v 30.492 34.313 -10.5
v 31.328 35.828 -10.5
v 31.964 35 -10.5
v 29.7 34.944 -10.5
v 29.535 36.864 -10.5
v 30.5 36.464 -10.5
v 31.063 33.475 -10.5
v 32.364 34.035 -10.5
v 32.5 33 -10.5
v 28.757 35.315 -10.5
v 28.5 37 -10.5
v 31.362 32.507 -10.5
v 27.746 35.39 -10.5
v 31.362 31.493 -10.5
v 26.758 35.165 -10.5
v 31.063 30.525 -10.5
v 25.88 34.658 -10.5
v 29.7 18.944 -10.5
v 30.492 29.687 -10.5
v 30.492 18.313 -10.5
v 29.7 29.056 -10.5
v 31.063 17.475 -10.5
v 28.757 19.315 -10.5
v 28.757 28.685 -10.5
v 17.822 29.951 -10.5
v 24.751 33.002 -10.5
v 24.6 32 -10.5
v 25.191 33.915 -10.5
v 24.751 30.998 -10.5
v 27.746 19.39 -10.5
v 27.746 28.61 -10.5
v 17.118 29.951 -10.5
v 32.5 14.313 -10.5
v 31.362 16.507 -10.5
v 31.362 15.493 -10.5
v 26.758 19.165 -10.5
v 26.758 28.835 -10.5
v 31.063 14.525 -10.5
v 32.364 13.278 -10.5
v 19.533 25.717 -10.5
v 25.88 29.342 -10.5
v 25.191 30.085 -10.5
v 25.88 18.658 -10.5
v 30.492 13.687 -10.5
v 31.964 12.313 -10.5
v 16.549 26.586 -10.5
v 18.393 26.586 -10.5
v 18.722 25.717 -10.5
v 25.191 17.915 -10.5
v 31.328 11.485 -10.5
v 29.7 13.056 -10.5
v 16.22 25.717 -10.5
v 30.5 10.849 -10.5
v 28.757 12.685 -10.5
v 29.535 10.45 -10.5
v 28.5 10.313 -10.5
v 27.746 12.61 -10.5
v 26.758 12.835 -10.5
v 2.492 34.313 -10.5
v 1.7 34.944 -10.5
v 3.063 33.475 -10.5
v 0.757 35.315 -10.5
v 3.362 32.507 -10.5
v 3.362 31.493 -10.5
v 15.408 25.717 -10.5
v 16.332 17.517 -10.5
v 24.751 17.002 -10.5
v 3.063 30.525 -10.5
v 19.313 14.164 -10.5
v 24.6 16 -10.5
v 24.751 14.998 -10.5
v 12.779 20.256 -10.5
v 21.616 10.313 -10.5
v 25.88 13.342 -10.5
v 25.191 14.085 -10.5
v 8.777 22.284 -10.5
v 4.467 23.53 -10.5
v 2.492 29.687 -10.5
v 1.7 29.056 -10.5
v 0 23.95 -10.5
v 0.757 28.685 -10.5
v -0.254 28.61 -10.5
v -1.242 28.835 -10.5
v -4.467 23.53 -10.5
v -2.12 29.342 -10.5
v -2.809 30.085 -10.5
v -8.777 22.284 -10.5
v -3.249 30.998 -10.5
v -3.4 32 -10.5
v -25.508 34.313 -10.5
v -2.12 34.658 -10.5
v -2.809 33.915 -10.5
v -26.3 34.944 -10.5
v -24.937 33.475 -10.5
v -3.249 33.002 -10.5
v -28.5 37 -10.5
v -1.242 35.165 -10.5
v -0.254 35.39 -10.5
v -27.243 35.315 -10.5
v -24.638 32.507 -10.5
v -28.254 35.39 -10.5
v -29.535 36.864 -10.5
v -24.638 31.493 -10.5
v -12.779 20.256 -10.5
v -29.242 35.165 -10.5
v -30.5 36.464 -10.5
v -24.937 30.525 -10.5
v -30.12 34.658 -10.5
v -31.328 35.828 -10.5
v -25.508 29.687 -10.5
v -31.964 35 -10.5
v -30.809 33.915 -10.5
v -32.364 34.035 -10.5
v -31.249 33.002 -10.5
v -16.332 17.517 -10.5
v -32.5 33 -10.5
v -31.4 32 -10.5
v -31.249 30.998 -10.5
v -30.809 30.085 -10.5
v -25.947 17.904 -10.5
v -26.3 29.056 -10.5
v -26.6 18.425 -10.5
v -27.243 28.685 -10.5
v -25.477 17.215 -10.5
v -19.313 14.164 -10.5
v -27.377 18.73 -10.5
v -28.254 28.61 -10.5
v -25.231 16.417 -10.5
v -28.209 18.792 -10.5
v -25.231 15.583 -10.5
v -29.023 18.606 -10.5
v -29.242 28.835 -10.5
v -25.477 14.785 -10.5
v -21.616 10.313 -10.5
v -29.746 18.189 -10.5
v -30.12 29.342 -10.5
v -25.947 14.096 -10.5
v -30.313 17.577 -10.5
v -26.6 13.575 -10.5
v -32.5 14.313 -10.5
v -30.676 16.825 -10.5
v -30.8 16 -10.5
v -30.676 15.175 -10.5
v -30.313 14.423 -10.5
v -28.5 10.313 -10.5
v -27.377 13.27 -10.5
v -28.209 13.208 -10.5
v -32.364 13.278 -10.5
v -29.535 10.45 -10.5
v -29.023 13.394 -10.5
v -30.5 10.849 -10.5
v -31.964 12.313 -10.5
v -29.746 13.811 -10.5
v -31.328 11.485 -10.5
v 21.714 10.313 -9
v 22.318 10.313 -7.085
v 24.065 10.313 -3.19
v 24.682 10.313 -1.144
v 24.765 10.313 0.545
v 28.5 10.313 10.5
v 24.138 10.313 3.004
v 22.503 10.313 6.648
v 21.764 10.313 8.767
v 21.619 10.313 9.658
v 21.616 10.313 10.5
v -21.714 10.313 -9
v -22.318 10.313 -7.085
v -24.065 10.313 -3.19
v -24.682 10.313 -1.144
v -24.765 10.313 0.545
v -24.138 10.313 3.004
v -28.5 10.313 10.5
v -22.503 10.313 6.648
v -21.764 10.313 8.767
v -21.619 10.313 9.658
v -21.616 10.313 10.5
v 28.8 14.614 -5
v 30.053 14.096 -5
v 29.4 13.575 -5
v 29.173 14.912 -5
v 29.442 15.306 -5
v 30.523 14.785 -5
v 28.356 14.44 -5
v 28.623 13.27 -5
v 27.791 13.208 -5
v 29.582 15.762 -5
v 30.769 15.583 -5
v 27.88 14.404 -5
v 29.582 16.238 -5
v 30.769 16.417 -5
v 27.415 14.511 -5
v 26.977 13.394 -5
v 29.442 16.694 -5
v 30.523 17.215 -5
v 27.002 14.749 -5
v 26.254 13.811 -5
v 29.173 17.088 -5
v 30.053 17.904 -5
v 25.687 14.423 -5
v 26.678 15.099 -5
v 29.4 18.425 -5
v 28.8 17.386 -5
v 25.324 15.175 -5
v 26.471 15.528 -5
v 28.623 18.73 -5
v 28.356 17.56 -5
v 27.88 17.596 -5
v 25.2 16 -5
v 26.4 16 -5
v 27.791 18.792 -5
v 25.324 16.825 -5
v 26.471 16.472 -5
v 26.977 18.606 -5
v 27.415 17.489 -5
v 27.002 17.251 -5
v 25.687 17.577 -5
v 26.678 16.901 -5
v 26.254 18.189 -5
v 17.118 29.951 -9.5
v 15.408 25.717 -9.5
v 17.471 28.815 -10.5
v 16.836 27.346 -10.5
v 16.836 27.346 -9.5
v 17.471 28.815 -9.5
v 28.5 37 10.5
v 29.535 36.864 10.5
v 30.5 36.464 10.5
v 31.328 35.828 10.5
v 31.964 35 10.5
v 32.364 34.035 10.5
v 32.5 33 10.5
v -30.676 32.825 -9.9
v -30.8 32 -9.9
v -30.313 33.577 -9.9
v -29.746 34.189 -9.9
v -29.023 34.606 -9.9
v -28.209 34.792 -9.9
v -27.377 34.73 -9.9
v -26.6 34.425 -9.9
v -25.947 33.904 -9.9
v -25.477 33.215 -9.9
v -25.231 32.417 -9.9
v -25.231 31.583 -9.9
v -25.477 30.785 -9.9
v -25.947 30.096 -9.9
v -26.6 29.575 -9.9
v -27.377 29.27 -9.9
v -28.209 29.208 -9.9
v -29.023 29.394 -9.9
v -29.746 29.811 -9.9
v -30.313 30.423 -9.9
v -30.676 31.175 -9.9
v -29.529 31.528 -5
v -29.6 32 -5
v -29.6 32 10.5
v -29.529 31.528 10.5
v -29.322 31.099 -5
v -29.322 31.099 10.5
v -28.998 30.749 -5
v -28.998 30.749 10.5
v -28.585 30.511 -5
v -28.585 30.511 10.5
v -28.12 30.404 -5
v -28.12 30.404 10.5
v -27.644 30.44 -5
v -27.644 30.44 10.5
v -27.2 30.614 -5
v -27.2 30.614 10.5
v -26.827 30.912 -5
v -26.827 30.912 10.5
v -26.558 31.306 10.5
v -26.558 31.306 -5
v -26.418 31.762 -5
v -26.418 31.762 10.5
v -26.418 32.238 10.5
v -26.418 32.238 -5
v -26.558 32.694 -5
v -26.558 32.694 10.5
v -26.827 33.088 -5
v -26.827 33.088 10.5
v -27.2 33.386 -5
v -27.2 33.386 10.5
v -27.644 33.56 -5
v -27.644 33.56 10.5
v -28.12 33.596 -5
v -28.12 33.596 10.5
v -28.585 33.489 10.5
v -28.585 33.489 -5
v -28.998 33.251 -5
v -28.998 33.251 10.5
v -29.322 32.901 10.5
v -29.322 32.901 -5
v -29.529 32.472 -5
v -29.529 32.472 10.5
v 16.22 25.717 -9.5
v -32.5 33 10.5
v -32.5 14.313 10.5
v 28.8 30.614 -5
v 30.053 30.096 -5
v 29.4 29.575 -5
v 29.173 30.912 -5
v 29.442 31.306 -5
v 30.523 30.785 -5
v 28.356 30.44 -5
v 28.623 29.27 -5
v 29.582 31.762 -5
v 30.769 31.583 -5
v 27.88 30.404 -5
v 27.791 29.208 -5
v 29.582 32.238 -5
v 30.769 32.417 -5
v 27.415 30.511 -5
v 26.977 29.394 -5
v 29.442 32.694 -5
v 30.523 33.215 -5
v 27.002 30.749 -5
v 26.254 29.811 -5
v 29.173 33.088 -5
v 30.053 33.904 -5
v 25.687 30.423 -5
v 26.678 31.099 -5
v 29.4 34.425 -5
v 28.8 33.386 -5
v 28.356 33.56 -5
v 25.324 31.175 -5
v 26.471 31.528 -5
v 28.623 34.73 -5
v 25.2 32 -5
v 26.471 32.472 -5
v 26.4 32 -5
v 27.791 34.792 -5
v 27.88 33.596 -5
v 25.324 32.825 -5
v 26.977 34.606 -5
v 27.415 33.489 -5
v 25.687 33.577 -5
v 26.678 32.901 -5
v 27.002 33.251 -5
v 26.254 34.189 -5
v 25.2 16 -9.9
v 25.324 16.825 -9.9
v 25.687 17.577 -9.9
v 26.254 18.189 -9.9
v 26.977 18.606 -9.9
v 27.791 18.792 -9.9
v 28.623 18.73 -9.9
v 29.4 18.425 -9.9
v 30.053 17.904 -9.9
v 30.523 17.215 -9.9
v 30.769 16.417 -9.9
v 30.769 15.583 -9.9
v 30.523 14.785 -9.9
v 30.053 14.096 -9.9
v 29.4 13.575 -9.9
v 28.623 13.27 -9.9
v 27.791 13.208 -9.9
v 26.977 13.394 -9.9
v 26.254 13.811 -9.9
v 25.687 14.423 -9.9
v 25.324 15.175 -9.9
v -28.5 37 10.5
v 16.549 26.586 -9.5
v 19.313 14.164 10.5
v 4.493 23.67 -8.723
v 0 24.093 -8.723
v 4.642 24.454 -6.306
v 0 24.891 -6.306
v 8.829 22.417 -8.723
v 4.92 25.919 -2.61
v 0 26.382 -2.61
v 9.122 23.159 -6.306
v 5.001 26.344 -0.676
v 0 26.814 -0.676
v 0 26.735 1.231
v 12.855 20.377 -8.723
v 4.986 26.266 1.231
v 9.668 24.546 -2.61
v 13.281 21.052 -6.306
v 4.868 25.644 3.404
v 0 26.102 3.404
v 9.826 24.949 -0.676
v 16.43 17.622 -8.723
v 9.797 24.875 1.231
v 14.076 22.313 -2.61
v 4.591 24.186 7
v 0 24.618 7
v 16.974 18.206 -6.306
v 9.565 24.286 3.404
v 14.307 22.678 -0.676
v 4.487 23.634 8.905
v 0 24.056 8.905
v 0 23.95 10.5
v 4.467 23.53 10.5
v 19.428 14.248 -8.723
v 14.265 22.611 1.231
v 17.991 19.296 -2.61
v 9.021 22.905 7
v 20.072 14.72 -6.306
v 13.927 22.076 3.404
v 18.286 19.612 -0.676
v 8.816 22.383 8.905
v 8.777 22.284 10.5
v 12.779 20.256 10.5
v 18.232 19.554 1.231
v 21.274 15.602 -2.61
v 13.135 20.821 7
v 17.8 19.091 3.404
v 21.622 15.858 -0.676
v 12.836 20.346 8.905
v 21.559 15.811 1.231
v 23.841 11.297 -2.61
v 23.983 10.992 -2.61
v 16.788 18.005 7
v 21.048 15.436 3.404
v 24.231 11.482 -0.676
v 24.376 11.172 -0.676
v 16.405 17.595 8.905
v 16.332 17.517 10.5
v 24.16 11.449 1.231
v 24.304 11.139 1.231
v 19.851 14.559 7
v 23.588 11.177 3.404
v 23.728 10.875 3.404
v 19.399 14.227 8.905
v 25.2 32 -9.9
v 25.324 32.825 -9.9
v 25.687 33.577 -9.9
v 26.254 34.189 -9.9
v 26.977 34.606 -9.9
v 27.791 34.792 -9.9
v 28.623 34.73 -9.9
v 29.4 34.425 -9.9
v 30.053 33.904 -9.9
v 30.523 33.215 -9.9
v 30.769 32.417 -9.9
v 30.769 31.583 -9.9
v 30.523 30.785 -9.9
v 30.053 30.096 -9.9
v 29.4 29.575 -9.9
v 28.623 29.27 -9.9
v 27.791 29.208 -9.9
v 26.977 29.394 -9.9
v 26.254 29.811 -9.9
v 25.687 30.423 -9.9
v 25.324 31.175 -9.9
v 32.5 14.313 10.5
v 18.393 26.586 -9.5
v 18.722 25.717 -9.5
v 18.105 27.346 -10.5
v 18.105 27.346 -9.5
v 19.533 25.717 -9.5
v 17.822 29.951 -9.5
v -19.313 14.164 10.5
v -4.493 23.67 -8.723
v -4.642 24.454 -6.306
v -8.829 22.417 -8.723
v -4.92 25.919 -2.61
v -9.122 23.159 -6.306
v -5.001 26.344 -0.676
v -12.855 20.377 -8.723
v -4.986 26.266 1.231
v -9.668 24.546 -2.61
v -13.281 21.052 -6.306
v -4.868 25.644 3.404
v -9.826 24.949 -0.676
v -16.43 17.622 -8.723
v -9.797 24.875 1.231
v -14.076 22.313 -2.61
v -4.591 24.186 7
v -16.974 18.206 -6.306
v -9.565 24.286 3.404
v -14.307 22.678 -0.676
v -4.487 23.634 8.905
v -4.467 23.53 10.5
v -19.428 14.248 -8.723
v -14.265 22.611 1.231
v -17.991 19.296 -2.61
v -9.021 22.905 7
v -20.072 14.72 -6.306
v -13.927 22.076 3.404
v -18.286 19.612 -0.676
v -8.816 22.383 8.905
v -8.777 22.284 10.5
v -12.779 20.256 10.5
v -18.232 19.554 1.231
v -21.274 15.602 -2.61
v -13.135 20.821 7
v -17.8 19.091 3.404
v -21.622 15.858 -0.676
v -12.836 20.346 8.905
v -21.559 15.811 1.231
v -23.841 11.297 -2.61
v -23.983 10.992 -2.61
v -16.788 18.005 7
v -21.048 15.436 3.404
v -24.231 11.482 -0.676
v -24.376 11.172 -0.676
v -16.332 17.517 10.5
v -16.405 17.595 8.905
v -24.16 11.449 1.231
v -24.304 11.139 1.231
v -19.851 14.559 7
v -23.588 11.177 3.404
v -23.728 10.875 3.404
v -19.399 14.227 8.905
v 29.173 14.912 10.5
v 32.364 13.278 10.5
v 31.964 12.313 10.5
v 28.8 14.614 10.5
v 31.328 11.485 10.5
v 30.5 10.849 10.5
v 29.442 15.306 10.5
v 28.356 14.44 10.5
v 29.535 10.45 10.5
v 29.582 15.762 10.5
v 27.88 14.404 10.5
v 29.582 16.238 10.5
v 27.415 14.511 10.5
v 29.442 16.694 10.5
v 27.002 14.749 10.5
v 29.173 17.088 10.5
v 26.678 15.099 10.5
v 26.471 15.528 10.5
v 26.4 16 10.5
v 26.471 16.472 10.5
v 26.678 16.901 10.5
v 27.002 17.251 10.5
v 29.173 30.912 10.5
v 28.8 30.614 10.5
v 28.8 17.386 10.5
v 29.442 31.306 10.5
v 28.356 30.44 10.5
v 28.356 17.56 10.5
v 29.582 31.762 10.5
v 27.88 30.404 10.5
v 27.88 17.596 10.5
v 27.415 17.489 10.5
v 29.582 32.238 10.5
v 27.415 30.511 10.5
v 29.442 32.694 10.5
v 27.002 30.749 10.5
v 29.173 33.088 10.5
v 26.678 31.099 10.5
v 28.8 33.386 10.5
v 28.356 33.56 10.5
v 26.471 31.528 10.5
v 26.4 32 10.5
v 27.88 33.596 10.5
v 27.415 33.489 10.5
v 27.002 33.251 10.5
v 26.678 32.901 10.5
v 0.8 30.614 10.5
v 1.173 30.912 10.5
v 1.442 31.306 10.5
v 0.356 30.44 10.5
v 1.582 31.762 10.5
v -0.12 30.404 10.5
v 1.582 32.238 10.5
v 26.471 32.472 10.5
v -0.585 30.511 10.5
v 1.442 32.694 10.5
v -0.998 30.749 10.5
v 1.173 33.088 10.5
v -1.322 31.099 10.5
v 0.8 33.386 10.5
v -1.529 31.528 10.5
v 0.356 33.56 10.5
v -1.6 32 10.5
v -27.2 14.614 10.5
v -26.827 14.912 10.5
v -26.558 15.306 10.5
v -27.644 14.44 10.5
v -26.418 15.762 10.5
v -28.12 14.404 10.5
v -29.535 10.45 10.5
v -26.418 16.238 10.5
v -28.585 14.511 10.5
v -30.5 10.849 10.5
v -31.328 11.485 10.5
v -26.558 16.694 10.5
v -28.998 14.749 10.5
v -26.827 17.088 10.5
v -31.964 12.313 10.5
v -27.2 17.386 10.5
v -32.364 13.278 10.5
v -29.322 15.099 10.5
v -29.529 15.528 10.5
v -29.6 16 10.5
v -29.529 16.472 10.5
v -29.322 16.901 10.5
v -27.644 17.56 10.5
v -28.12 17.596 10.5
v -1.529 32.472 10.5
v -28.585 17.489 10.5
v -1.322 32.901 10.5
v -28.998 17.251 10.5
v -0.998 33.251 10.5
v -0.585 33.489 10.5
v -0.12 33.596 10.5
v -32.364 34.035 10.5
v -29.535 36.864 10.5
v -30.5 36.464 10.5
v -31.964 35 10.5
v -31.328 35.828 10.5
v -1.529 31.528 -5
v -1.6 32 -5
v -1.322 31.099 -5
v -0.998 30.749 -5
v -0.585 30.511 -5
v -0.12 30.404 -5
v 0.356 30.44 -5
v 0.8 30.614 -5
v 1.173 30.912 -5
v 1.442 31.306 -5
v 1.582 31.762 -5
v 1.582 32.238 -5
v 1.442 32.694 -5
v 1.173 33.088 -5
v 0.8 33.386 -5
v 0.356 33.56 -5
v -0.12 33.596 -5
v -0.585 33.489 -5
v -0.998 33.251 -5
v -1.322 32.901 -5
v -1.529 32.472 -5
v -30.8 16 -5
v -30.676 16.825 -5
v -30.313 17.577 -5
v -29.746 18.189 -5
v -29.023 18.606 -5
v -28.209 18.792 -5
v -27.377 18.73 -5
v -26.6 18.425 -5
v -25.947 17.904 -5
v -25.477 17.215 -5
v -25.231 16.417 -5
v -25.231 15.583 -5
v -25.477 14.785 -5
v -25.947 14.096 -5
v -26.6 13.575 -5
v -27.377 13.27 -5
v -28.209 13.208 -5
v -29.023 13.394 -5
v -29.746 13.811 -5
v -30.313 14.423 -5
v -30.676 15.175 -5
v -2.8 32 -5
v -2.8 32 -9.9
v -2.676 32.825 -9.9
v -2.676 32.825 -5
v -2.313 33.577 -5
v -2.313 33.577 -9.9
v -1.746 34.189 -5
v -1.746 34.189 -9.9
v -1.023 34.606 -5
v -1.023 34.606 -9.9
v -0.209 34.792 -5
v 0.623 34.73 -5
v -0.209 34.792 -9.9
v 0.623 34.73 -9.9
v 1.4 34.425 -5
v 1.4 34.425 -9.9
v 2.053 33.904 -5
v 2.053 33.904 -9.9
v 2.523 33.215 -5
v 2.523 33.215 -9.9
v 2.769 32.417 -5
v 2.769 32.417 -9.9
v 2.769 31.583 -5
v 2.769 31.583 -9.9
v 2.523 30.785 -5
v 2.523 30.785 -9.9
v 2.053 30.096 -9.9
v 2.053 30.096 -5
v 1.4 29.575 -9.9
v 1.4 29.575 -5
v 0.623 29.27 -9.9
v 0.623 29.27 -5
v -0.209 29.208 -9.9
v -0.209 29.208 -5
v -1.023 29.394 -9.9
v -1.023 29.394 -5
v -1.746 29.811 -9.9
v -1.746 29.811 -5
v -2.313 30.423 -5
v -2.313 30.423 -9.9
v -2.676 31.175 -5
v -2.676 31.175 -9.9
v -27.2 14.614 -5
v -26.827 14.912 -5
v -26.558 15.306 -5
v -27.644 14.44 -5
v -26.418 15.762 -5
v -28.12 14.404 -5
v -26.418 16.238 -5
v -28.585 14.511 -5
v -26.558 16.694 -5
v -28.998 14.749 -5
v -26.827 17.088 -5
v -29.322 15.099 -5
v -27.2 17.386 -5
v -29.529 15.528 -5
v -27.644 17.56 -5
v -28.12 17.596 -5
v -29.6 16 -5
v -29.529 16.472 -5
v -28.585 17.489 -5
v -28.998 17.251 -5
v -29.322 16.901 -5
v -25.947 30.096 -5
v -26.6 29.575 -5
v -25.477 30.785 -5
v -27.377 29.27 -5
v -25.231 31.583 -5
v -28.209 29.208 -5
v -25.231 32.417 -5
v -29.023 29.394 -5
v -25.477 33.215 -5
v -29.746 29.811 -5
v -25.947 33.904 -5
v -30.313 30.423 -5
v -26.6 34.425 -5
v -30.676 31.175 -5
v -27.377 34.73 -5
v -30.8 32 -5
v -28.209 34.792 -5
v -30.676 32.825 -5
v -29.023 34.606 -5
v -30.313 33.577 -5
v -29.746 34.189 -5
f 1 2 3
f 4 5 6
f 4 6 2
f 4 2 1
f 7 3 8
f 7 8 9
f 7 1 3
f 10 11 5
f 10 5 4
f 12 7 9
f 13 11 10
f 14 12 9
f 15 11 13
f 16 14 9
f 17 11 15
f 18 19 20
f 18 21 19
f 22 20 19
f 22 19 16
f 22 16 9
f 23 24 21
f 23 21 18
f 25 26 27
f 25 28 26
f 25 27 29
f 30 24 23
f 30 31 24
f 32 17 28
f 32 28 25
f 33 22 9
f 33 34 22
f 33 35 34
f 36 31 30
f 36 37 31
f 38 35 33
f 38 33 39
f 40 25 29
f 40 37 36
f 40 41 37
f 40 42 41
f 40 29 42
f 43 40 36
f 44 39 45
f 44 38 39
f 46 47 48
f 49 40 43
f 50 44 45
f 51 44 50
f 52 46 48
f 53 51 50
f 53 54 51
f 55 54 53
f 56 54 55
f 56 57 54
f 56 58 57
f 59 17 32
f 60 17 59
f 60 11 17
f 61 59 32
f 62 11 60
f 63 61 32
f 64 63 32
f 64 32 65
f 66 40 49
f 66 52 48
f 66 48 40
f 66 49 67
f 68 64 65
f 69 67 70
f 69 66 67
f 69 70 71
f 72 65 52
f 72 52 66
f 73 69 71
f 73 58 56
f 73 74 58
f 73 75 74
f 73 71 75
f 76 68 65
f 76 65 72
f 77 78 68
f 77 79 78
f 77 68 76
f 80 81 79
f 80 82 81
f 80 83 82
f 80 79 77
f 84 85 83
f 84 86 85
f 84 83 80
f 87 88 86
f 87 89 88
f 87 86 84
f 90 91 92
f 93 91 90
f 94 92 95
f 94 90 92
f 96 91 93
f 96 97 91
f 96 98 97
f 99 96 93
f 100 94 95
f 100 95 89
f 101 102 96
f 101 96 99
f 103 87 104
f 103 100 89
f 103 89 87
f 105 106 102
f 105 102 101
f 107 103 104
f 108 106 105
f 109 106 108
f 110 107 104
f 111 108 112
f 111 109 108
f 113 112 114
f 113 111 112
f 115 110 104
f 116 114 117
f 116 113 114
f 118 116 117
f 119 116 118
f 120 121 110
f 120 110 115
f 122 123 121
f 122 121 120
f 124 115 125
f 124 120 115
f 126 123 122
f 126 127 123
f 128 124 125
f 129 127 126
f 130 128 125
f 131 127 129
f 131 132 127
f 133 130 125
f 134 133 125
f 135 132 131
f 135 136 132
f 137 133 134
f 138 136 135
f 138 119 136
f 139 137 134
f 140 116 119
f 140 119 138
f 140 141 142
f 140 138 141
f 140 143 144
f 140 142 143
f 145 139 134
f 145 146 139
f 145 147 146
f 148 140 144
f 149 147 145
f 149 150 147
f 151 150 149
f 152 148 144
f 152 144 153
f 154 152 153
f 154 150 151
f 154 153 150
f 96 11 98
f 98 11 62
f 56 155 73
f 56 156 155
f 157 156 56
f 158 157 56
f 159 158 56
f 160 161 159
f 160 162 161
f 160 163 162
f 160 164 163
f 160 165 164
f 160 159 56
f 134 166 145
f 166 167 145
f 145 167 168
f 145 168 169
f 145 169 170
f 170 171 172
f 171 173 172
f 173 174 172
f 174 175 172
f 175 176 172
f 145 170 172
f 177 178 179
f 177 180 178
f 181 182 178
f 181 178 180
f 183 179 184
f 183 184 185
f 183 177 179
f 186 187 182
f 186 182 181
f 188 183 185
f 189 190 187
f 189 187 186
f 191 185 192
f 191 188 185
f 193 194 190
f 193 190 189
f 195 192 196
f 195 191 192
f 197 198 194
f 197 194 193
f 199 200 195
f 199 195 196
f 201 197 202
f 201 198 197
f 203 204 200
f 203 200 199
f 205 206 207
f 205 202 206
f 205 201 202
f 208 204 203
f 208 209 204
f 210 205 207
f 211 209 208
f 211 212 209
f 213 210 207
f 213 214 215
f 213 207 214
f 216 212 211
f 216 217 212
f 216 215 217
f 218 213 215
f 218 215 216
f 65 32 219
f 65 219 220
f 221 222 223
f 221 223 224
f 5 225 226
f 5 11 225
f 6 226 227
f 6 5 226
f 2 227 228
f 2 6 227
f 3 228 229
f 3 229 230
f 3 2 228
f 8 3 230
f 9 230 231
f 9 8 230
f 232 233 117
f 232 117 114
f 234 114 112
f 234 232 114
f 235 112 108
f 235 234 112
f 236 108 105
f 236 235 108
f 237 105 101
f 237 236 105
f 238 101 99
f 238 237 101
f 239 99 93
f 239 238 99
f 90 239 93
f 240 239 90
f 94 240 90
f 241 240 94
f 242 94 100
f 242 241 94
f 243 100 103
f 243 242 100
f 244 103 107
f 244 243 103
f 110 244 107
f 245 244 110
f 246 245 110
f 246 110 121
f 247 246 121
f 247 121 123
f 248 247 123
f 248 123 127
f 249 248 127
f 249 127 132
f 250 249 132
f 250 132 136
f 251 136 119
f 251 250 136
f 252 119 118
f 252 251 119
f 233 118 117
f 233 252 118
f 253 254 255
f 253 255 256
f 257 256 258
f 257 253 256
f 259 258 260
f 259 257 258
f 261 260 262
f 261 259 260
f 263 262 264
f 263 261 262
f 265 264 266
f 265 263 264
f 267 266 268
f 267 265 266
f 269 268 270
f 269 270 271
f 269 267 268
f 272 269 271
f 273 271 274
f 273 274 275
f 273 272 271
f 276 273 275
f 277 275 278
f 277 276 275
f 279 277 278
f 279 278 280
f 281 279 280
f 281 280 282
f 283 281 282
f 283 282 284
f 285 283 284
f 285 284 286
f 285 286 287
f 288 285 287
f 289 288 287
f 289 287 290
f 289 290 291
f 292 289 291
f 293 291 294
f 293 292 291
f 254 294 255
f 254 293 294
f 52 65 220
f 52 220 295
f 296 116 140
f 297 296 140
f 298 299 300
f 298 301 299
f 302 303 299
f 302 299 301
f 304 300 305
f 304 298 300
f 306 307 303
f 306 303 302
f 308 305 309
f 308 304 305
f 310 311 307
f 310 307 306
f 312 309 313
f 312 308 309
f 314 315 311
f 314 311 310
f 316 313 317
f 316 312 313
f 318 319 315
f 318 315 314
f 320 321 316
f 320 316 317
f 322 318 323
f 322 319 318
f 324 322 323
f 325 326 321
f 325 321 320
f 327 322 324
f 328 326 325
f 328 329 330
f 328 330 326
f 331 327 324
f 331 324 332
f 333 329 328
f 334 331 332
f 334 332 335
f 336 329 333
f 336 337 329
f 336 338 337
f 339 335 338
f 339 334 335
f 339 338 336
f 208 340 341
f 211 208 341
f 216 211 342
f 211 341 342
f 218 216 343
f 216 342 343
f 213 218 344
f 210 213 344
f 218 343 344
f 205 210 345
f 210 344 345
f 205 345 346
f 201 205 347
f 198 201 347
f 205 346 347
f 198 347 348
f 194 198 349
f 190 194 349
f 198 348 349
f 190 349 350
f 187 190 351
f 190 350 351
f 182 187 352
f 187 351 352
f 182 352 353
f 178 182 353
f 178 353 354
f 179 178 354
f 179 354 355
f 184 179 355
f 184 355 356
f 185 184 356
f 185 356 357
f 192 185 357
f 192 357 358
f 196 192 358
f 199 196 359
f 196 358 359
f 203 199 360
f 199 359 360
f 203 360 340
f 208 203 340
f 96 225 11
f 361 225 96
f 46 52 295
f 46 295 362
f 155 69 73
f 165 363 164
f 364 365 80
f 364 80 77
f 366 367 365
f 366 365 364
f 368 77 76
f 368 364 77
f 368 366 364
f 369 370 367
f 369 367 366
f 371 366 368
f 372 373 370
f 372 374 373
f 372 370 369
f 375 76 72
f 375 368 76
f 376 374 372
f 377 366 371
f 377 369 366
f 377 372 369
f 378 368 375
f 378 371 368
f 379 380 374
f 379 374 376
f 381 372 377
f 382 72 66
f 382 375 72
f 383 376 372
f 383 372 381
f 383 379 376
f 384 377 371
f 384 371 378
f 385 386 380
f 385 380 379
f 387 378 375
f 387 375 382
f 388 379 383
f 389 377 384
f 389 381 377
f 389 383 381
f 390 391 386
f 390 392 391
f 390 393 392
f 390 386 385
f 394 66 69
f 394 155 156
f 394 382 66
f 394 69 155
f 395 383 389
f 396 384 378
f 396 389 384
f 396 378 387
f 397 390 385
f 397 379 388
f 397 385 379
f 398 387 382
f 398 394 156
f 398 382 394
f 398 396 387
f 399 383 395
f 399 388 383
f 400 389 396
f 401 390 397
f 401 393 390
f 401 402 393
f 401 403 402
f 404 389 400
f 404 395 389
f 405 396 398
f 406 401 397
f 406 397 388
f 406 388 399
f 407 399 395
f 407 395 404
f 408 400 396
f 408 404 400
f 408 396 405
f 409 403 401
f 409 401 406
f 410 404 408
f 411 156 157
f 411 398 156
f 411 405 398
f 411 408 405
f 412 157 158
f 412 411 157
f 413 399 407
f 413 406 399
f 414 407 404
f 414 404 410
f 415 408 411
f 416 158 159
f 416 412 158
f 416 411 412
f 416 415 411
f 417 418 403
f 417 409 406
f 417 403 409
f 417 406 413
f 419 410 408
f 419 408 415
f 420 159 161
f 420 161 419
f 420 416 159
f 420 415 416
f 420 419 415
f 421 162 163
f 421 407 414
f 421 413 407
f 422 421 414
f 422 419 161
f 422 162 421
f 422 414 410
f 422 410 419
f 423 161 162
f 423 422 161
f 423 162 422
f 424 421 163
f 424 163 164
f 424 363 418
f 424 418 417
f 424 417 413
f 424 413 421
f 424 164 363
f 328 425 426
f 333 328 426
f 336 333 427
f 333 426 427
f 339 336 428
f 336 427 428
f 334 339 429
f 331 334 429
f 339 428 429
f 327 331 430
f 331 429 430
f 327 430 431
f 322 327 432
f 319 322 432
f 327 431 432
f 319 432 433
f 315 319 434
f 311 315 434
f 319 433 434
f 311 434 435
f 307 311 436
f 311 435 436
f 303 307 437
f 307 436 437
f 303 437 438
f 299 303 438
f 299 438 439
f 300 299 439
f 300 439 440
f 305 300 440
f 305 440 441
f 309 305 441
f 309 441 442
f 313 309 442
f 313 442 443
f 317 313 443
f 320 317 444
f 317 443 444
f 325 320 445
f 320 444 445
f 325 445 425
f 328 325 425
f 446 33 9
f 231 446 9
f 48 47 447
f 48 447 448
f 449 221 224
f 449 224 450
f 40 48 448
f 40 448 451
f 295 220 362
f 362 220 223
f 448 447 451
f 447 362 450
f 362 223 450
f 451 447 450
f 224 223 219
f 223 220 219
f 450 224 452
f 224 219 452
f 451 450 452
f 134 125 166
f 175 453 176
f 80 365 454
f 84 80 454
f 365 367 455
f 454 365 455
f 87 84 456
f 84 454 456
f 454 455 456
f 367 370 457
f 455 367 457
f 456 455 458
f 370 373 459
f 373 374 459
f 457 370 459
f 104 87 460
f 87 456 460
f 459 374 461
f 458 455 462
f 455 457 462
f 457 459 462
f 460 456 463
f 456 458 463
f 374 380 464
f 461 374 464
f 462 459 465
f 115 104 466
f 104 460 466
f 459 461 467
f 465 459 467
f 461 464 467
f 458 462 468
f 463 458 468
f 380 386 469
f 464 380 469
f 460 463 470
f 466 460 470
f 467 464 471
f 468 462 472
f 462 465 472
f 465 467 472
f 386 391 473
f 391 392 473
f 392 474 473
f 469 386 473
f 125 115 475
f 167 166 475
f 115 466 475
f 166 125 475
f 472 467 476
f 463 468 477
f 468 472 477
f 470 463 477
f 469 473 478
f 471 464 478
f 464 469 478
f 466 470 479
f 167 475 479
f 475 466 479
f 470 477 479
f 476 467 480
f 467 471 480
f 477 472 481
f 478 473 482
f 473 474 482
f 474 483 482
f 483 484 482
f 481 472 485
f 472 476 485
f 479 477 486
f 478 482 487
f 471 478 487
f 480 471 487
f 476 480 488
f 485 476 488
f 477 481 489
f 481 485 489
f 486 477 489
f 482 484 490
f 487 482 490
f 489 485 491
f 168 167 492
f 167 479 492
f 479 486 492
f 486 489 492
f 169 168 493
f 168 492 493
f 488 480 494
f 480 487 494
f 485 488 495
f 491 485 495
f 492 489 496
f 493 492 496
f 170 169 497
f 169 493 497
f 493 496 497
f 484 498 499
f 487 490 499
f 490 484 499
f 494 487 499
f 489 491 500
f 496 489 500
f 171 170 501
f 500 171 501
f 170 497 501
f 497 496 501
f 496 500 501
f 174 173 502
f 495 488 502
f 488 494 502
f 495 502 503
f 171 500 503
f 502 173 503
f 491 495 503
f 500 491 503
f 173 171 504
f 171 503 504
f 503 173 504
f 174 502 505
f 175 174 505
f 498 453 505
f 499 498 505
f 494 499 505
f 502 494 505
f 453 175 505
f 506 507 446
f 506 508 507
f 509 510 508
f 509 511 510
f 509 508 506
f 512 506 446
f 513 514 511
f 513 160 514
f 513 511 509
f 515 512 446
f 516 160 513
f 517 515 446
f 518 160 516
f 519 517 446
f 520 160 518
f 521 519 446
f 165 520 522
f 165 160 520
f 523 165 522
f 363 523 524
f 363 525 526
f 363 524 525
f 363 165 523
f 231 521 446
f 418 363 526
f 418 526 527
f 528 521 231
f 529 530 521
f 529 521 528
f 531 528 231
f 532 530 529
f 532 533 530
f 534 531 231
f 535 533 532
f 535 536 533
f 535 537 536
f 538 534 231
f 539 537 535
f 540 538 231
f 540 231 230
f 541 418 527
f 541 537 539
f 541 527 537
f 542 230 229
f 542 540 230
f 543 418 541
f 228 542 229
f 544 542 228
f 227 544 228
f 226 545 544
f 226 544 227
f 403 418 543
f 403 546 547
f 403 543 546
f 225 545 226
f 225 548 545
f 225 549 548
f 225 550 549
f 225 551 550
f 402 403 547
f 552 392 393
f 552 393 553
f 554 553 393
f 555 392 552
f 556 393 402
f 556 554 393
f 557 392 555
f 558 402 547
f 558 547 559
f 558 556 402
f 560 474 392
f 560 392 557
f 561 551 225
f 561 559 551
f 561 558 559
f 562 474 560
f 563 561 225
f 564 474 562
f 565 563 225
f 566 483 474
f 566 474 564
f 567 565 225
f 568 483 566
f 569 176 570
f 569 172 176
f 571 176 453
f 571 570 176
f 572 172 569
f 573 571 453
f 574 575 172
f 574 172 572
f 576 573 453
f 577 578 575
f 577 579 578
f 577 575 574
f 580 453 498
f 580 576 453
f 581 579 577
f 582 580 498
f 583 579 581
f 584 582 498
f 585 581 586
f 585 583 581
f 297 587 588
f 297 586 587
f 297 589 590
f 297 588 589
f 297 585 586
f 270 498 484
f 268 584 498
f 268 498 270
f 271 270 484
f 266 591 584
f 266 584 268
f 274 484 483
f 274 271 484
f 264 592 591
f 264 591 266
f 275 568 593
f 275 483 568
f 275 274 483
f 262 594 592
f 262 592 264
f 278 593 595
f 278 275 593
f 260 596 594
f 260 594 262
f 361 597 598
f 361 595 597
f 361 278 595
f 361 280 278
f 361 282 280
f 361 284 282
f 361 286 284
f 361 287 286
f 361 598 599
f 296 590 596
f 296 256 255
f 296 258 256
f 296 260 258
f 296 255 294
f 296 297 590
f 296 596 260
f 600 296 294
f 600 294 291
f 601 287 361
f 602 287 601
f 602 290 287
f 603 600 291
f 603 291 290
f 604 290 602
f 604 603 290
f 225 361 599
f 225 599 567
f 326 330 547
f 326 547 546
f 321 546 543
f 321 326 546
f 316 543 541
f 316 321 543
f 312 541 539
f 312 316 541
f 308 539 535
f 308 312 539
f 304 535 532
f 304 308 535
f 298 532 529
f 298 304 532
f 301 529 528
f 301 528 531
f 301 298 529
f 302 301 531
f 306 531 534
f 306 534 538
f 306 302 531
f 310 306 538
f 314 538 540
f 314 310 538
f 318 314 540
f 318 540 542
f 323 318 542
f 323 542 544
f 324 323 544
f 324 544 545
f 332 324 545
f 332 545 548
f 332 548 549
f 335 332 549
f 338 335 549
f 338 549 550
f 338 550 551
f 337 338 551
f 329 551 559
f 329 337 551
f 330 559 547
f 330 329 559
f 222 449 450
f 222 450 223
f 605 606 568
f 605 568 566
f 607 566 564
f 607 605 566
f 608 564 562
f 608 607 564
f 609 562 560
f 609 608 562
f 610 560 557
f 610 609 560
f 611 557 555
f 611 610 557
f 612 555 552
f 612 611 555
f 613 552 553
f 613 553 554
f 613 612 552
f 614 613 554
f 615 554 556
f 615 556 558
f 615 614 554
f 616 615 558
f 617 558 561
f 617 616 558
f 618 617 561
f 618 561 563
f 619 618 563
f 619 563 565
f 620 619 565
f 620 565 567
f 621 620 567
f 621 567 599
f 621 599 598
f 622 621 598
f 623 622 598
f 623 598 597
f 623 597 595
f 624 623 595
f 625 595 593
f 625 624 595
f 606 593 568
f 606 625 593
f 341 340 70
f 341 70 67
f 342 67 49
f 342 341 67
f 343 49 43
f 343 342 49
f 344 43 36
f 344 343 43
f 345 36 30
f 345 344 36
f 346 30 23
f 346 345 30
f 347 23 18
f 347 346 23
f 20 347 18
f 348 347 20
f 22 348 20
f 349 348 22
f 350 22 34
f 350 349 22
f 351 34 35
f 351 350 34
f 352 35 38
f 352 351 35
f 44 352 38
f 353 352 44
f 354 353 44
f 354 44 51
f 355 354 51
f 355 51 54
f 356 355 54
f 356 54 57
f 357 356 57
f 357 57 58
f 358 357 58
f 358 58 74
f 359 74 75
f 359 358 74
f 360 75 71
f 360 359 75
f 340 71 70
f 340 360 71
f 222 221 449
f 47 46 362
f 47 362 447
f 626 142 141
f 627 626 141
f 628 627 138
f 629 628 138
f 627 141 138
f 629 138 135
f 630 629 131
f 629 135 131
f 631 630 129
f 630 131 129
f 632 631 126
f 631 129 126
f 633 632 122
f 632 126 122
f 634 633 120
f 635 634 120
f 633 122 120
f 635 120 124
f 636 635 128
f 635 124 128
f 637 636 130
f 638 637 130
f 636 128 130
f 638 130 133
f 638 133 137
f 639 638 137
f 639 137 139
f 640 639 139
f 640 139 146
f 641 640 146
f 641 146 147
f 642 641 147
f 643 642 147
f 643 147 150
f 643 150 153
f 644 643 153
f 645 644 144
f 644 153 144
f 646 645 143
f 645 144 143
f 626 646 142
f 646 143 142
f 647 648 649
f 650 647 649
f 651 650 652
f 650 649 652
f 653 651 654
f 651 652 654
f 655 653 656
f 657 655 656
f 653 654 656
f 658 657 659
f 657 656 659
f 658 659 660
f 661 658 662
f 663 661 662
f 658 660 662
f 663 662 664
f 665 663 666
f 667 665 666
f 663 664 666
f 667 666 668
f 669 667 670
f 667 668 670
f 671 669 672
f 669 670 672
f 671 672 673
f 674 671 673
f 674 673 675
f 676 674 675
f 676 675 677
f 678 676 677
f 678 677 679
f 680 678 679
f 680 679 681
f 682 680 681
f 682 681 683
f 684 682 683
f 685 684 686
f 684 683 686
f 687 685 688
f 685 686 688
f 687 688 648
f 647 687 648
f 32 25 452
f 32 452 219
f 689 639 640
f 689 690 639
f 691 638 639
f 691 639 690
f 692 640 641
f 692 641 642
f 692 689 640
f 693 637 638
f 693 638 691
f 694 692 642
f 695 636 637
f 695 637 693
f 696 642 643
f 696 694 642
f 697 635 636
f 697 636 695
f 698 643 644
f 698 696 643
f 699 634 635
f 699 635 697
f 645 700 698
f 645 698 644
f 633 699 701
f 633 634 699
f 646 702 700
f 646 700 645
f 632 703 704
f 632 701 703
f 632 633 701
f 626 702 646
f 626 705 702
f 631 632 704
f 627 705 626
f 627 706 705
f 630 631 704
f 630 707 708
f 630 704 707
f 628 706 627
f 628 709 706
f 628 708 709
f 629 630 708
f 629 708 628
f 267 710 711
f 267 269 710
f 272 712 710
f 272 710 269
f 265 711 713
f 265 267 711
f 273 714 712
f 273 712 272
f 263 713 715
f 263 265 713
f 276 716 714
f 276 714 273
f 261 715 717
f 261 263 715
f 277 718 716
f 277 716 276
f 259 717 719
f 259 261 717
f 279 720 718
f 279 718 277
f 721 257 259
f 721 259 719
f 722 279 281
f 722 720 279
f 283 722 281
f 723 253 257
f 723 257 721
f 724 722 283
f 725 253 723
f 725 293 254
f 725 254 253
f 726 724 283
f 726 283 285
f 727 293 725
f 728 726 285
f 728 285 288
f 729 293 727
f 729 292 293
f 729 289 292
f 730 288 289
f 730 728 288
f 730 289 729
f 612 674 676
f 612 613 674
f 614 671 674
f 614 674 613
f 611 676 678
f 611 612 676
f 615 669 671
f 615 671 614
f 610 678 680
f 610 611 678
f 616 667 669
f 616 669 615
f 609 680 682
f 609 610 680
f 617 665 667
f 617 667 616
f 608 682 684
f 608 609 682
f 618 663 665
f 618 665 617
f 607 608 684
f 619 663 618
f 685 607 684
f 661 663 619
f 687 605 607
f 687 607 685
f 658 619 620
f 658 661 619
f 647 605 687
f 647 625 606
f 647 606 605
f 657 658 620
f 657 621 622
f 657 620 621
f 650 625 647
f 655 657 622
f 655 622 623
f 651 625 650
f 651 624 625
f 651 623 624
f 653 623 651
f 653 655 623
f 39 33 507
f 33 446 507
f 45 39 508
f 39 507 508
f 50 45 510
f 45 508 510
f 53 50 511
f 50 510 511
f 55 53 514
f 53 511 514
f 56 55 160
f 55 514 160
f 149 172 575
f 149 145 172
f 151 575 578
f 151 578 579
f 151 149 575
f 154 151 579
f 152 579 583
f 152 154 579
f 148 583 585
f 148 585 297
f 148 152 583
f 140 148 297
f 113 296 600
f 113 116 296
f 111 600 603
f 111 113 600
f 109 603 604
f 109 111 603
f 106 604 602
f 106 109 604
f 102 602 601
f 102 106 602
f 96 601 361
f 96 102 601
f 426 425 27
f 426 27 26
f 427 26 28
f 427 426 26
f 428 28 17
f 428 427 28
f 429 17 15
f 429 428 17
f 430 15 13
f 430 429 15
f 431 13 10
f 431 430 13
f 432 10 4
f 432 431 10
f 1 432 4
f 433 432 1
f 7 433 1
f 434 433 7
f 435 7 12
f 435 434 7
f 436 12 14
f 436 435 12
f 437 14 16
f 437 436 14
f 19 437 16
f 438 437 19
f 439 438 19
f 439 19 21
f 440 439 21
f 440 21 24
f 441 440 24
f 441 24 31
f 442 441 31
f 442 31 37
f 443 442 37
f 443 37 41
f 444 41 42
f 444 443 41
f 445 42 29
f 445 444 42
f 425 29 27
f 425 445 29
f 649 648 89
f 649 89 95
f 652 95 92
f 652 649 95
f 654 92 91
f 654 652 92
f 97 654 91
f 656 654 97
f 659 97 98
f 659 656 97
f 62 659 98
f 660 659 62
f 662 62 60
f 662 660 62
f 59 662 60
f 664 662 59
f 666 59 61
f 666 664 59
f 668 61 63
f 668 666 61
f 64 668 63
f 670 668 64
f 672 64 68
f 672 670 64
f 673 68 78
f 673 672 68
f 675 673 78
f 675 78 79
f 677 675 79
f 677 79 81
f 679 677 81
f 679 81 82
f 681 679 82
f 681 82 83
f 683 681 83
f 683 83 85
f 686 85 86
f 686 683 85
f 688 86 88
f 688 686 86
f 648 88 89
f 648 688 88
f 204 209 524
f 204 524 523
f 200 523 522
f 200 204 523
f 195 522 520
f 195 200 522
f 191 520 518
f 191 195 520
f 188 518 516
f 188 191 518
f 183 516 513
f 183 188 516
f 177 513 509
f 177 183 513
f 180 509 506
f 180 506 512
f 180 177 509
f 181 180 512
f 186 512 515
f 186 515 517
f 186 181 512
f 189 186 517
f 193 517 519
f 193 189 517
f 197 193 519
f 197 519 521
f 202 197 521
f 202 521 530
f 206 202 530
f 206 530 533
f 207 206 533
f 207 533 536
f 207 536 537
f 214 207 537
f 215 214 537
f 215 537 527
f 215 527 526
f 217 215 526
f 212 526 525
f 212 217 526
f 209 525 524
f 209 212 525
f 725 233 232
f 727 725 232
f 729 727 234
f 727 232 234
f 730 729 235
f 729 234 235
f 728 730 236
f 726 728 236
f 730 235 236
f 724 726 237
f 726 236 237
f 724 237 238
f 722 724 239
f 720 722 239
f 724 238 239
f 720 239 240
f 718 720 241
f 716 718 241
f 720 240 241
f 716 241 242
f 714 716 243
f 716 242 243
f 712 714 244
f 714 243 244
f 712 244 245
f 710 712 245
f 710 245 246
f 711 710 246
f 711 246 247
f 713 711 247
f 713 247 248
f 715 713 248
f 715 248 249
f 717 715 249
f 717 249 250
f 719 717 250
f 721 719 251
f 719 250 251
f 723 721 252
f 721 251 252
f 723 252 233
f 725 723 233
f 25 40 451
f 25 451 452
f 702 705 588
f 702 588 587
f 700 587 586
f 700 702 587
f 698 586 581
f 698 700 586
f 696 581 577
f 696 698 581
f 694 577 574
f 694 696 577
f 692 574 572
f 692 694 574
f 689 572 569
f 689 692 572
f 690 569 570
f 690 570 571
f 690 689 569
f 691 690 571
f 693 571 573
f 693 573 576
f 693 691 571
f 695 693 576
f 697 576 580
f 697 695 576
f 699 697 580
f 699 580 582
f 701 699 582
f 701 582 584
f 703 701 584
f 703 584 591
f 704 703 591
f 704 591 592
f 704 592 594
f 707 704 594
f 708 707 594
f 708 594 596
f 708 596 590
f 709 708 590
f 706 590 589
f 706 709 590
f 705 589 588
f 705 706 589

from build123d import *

# Parameters (mm, degrees)
SKETCH1_R                   = 1.6
BOSS_EXTRUDE1_DEPTH         = 10.5
FILLET1_R                   = 4
SKETCH4_R                   = 2.8
CUT_EXTRUDE1_DEPTH          = 5.5
CHAMFER3_SIZE               = 0.6
REVOLUCI_N1_ANGLE           = 67.5
REVOLUCI_N1_OTHER_WAY_ANGLE = 67.5
CORTAR_EXTRUIR3_DEPTH       = 1
CORTAR_EXTRUIR4_DEPTH       = 54.537370165
CORTAR_EXTRUIR4_DEPTH_BACK  = 54.537370165
CROQUIS6_W                  = 49.797106802
CROQUIS6_H                  = 15.102267028


with BuildPart() as part:
    # Sketch1 → Boss-Extrude1 (new, symmetric)
    with BuildSketch(Plane.XY):
        with BuildLine():
            Line((-32.5, 10.313318502), (-24.898553401, 10.313318502))
            ThreePointArc((-24.898553401, 10.313318502), (0, 26.95), (24.898553401, 10.313318502))
            Line((24.898553401, 10.313318502), (32.5, 10.313318502))
            Line((32.5, 10.313318502), (32.5, 37))
            Line((32.5, 37), (-32.5, 37))
            Line((-32.5, 37), (-32.5, 10.313318502))
        make_face()
        with Locations(Location((-28, 16, 0), (0, 0, 180))):
            Circle(SKETCH1_R, mode=Mode.SUBTRACT)
        with Locations(Location((-28, 32, 0), (0, 0, 180))):
            Circle(SKETCH1_R, mode=Mode.SUBTRACT)
        with Locations(Location((28, 16, 0), (0, 0, 180))):
            Circle(SKETCH1_R, mode=Mode.SUBTRACT)
        with Locations(Location((0, 32, 0), (0, 0, 180))):
            Circle(SKETCH1_R, mode=Mode.SUBTRACT)
        with Locations(Location((28, 32, 0), (0, 0, 180))):
            Circle(SKETCH1_R, mode=Mode.SUBTRACT)
    extrude(amount=BOSS_EXTRUDE1_DEPTH, both=True)

    # Fillet1
    fillet1_edges = [part.edges().sort_by_distance(p)[0] for p in [
        (-32.5, 10.313318502, 0),
        (-32.5, 37, 0),
        (32.5, 37, 0),
        (32.5, 10.313318502, 0),
    ]]
    fillet(fillet1_edges, radius=FILLET1_R)

    # Sketch4 → Cut-Extrude1 (cut)
    with BuildSketch(Plane(origin=(0, 0, -10.5), x_dir=(-1, 0, 0), z_dir=(0, 0, -1))):
        with Locations((-28, 32)):
            Circle(SKETCH4_R)
        with Locations((0, 32)):
            Circle(SKETCH4_R)
        with Locations((28, 32)):
            Circle(SKETCH4_R)
        with Locations((-28, 16)):
            Circle(SKETCH4_R)
        with Locations((28, 16)):
            Circle(SKETCH4_R)
    extrude(amount=-CUT_EXTRUDE1_DEPTH, mode=Mode.SUBTRACT)

    # Chamfer3
    chamfer3_edges = [part.edges().sort_by_distance(p)[0] for p in [
        (30.8, 16, -10.5),
        (-25.2, 32, -10.5),
        (2.8, 32, -10.5),
        (30.8, 32, -10.5),
    ]]
    chamfer(chamfer3_edges, length=CHAMFER3_SIZE)

    # Croquis1 → Revolución1 (revolve)
    with BuildSketch(Plane(origin=(0, 0, 0), x_dir=(0, 0, -1), z_dir=(1, 0, 0))):
        with BuildLine():
            Line((10.5, 26.95), (-10.5, 26.95))
            Line((-10.5, 26.95), (-10.5, 23.95))
            add(Edge.make_bspline(
                [(10.5, 23.95), (7.13922955, 23.695558229), (0, 30.004441771), (-7.13922955, 23.695558229), (-10.5, 23.95)],
                knots=[0, 0, 0, 0, 0.5, 1, 1, 1, 1], degree=3))
            Line((10.5, 23.95), (10.5, 26.95))
        make_face()
    revolve(axis=Axis((0, 0, 10.5), (0, 0, -1)), revolution_arc=REVOLUCI_N1_ANGLE)

    # Croquis1 → Revolución1 other way (revolve)
    with BuildSketch(Plane(origin=(0, 0, 0), x_dir=(0, 0, -1), z_dir=(1, 0, 0))):
        with BuildLine():
            Line((10.5, 26.95), (-10.5, 26.95))
            Line((-10.5, 26.95), (-10.5, 23.95))
            add(Edge.make_bspline(
                [(10.5, 23.95), (7.13922955, 23.695558229), (0, 30.004441771), (-7.13922955, 23.695558229), (-10.5, 23.95)],
                knots=[0, 0, 0, 0, 0.5, 1, 1, 1, 1], degree=3))
            Line((10.5, 23.95), (10.5, 26.95))
        make_face()
    revolve(axis=Axis((0, 0, 10.5), (0, 0, 1)), revolution_arc=REVOLUCI_N1_OTHER_WAY_ANGLE)

    # Croquis5 → Cortar-Extruir3 (cut)
    with BuildSketch(Plane(origin=(0, 0, -10.5), x_dir=(-1, 0, 0), z_dir=(0, 0, -1))):
        Polygon((-17.822469022, 29.950787399), (-17.11776149, 29.950787399), (-15.408146105, 25.717454066), (-16.219704599, 25.717454066), (-16.548737719, 26.585830134), (-18.393188841, 26.585830134), (-18.72222196, 25.717454066), (-19.53293243, 25.717454066), align=None)
        Polygon((-17.470539268, 28.815283927), (-18.104860849, 27.345659194), (-16.836217687, 27.345659194), align=None, mode=Mode.SUBTRACT)
    extrude(amount=-CORTAR_EXTRUIR3_DEPTH, mode=Mode.SUBTRACT)

    # Croquis6 → Cortar-Extruir4 (cut, two sides: drawn at the far end of the back side and taken through both)
    with BuildSketch(Plane(origin=(0, 0, -10.5), x_dir=(-1, 0, 0), z_dir=(0, 0, -1)).offset(-CORTAR_EXTRUIR4_DEPTH_BACK)):
        with Locations((0, 2.762184988)):
            Rectangle(CROQUIS6_W, CROQUIS6_H)
    extrude(amount=CORTAR_EXTRUIR4_DEPTH + CORTAR_EXTRUIR4_DEPTH_BACK, mode=Mode.SUBTRACT)


solid = part.part
